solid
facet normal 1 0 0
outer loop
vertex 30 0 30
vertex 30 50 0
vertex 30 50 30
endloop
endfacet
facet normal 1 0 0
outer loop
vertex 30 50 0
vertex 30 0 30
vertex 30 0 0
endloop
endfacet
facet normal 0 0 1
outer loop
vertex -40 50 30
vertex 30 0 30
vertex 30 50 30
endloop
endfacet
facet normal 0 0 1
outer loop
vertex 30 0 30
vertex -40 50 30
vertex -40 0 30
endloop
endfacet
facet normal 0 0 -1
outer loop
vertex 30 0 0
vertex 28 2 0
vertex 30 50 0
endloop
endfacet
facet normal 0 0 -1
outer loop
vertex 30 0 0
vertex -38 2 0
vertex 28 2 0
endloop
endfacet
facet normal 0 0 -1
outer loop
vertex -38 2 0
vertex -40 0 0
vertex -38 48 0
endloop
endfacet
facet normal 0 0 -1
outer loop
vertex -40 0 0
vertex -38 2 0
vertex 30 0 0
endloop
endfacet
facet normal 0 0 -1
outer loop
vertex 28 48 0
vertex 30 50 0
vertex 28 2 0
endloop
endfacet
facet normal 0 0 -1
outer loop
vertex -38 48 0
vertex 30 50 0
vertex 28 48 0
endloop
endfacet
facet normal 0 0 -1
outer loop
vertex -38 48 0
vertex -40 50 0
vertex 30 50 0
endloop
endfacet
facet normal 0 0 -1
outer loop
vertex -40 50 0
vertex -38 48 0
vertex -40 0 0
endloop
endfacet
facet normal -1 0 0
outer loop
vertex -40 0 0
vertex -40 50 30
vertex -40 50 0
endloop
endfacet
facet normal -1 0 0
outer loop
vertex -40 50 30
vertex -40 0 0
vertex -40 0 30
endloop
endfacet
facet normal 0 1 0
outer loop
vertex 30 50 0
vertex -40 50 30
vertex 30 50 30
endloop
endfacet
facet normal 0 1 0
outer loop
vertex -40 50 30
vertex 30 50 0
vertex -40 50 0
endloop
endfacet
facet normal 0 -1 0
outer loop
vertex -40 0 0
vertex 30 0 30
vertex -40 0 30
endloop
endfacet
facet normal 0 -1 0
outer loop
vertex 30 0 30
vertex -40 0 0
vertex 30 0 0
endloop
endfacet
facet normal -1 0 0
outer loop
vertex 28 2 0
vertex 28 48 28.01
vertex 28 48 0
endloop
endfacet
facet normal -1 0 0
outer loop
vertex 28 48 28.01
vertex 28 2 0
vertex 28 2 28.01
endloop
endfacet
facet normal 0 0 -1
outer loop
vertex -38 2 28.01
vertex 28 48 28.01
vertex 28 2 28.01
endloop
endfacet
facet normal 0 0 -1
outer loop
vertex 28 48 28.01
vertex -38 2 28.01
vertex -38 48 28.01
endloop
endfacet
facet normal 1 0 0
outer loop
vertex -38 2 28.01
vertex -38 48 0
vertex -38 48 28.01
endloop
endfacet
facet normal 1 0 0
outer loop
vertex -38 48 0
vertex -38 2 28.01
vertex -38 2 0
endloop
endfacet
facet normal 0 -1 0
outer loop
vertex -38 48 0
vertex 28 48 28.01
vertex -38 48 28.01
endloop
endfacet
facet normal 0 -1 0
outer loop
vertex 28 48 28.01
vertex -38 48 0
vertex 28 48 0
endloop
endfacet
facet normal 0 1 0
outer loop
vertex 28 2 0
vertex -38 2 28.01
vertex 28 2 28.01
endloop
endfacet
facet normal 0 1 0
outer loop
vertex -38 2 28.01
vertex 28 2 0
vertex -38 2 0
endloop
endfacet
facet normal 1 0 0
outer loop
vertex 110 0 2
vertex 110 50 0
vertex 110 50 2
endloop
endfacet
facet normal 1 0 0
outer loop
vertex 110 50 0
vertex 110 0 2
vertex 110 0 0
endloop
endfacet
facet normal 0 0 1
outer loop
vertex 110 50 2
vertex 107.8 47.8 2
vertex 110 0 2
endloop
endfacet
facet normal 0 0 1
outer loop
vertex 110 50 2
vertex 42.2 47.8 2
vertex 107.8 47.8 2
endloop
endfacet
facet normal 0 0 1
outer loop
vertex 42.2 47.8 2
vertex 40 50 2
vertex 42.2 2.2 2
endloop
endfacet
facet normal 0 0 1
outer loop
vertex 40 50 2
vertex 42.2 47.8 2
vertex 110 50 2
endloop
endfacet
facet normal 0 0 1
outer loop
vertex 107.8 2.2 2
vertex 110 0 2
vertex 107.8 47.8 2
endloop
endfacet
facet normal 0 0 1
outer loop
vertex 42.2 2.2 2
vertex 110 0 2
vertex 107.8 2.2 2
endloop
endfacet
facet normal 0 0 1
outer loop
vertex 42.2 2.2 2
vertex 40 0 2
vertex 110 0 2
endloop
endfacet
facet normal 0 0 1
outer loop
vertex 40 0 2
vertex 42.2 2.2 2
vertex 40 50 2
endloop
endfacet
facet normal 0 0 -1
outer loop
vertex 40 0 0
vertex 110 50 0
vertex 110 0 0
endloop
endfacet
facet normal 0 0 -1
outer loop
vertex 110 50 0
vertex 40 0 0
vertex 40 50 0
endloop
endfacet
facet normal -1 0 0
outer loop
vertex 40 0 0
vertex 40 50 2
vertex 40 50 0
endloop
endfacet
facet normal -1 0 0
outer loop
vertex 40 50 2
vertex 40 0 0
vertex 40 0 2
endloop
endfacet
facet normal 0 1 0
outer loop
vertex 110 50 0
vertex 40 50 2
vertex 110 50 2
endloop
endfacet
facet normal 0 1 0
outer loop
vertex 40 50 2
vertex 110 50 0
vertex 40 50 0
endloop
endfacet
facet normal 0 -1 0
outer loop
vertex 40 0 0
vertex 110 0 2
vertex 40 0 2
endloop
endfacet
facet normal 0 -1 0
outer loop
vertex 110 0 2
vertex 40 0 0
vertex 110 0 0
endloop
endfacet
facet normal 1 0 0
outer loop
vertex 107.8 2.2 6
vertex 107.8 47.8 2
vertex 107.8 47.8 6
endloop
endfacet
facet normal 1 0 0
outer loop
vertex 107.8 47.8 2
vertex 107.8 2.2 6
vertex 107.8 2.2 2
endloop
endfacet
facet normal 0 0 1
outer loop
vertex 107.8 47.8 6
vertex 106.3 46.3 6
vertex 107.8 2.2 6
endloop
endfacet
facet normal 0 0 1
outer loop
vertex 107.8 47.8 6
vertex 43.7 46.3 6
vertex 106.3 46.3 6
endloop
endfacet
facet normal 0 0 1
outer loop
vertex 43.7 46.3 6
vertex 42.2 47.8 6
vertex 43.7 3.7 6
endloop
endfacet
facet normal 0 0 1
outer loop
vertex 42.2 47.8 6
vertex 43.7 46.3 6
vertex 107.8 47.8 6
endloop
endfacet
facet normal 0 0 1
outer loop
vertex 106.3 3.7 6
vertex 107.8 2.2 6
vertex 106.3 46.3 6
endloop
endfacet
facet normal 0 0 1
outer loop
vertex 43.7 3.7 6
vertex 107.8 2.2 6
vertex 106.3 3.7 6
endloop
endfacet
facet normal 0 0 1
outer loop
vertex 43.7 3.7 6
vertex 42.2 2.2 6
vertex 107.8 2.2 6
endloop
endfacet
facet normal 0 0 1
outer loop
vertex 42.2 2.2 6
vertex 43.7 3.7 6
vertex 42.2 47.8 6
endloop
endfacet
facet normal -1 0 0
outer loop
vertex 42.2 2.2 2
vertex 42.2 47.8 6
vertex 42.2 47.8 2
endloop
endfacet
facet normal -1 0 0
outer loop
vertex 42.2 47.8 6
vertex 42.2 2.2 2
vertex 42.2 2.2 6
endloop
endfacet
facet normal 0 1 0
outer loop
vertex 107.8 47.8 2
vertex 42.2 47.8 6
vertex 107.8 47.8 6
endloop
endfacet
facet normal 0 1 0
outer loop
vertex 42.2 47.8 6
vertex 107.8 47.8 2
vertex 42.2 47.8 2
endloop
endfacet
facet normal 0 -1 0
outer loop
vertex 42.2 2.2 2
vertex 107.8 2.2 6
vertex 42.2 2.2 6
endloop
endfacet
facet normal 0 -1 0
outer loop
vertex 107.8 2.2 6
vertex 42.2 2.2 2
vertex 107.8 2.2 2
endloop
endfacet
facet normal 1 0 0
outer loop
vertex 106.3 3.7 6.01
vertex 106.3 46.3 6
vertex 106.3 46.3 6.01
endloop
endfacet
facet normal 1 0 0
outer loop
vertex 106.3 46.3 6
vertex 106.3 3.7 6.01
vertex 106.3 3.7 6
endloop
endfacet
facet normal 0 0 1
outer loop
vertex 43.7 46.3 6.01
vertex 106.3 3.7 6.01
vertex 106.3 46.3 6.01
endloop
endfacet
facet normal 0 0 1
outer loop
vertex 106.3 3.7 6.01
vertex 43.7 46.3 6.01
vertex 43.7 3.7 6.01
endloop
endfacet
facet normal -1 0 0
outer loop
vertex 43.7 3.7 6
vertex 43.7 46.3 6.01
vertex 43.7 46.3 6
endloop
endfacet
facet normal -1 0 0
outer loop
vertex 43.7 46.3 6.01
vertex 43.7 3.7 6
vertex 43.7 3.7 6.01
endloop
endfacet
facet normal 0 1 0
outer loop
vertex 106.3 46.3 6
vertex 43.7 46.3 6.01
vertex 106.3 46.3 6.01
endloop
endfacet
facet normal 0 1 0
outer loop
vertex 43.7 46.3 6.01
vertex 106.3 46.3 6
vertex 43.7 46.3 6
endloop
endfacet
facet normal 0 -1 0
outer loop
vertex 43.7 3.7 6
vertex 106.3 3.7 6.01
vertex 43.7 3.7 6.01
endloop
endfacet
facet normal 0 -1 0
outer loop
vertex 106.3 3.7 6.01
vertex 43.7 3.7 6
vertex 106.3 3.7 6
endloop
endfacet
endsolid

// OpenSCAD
// Dimensions for the box and lid
box_outer_x = 70;
box_outer_y = 50;
box_outer_z = 30;
wall_thickness = 2;
floor_thickness = 2;

lid_plate_x = 70;
lid_plate_y = 50;
lid_plate_z = 2;
lip_thickness = 1.5;
lip_height = 4;
lip_outer_x = 65.6;
lip_outer_y = 45.6;

// Clearance and gap settings
gap_between_parts = 10;
$fn = 64;

// Calculate derived dimensions
box_inner_x = box_outer_x - 2 * wall_thickness;
box_inner_y = box_outer_y - 2 * wall_thickness;
box_inner_z = box_outer_z - floor_thickness;

// Position offsets to center parts and maintain gap
box_offset_x = -(box_outer_x / 2 + gap_between_parts / 2);
lid_offset_x = (lid_plate_x / 2 + gap_between_parts / 2);

// Part 1: The Box
translate([box_offset_x, 0, 0])
difference()
{
    // Outer shell of the box
    cube([box_outer_x, box_outer_y, box_outer_z], center = false);
    
    // Inner cavity (open top)
    // Extend slightly past the top to ensure clean cut
    translate([wall_thickness, wall_thickness, -0.01])
    cube([box_inner_x, box_inner_y, box_inner_z + 0.02], center = false);
}

// Part 2: The Lid (printed upside down, so plate is on bed)
translate([lid_offset_x, 0, 0])
union()
{
    // Main plate lying on the bed
    cube([lid_plate_x, lid_plate_y, lid_plate_z], center = false);
    
    // Lip structure
    // The lip is centered on the plate
    lip_offset_x = (lid_plate_x - lip_outer_x) / 2;
    lip_offset_y = (lid_plate_y - lip_outer_y) / 2;
    
    // Outer wall of the lip
    translate([lip_offset_x, lip_offset_y, lid_plate_z])
    cube([lip_outer_x, lip_outer_y, lip_height], center = false);
    
    // Inner cutout of the lip to make it a wall
    // Extend slightly past the bottom and top to ensure clean cut
    translate([lip_offset_x + lip_thickness, lip_offset_y + lip_thickness, lid_plate_z - 0.01])
    cube([lip_outer_x - 2 * lip_thickness, lip_outer_y - 2 * lip_thickness, lip_height + 0.02], center = false);
}
